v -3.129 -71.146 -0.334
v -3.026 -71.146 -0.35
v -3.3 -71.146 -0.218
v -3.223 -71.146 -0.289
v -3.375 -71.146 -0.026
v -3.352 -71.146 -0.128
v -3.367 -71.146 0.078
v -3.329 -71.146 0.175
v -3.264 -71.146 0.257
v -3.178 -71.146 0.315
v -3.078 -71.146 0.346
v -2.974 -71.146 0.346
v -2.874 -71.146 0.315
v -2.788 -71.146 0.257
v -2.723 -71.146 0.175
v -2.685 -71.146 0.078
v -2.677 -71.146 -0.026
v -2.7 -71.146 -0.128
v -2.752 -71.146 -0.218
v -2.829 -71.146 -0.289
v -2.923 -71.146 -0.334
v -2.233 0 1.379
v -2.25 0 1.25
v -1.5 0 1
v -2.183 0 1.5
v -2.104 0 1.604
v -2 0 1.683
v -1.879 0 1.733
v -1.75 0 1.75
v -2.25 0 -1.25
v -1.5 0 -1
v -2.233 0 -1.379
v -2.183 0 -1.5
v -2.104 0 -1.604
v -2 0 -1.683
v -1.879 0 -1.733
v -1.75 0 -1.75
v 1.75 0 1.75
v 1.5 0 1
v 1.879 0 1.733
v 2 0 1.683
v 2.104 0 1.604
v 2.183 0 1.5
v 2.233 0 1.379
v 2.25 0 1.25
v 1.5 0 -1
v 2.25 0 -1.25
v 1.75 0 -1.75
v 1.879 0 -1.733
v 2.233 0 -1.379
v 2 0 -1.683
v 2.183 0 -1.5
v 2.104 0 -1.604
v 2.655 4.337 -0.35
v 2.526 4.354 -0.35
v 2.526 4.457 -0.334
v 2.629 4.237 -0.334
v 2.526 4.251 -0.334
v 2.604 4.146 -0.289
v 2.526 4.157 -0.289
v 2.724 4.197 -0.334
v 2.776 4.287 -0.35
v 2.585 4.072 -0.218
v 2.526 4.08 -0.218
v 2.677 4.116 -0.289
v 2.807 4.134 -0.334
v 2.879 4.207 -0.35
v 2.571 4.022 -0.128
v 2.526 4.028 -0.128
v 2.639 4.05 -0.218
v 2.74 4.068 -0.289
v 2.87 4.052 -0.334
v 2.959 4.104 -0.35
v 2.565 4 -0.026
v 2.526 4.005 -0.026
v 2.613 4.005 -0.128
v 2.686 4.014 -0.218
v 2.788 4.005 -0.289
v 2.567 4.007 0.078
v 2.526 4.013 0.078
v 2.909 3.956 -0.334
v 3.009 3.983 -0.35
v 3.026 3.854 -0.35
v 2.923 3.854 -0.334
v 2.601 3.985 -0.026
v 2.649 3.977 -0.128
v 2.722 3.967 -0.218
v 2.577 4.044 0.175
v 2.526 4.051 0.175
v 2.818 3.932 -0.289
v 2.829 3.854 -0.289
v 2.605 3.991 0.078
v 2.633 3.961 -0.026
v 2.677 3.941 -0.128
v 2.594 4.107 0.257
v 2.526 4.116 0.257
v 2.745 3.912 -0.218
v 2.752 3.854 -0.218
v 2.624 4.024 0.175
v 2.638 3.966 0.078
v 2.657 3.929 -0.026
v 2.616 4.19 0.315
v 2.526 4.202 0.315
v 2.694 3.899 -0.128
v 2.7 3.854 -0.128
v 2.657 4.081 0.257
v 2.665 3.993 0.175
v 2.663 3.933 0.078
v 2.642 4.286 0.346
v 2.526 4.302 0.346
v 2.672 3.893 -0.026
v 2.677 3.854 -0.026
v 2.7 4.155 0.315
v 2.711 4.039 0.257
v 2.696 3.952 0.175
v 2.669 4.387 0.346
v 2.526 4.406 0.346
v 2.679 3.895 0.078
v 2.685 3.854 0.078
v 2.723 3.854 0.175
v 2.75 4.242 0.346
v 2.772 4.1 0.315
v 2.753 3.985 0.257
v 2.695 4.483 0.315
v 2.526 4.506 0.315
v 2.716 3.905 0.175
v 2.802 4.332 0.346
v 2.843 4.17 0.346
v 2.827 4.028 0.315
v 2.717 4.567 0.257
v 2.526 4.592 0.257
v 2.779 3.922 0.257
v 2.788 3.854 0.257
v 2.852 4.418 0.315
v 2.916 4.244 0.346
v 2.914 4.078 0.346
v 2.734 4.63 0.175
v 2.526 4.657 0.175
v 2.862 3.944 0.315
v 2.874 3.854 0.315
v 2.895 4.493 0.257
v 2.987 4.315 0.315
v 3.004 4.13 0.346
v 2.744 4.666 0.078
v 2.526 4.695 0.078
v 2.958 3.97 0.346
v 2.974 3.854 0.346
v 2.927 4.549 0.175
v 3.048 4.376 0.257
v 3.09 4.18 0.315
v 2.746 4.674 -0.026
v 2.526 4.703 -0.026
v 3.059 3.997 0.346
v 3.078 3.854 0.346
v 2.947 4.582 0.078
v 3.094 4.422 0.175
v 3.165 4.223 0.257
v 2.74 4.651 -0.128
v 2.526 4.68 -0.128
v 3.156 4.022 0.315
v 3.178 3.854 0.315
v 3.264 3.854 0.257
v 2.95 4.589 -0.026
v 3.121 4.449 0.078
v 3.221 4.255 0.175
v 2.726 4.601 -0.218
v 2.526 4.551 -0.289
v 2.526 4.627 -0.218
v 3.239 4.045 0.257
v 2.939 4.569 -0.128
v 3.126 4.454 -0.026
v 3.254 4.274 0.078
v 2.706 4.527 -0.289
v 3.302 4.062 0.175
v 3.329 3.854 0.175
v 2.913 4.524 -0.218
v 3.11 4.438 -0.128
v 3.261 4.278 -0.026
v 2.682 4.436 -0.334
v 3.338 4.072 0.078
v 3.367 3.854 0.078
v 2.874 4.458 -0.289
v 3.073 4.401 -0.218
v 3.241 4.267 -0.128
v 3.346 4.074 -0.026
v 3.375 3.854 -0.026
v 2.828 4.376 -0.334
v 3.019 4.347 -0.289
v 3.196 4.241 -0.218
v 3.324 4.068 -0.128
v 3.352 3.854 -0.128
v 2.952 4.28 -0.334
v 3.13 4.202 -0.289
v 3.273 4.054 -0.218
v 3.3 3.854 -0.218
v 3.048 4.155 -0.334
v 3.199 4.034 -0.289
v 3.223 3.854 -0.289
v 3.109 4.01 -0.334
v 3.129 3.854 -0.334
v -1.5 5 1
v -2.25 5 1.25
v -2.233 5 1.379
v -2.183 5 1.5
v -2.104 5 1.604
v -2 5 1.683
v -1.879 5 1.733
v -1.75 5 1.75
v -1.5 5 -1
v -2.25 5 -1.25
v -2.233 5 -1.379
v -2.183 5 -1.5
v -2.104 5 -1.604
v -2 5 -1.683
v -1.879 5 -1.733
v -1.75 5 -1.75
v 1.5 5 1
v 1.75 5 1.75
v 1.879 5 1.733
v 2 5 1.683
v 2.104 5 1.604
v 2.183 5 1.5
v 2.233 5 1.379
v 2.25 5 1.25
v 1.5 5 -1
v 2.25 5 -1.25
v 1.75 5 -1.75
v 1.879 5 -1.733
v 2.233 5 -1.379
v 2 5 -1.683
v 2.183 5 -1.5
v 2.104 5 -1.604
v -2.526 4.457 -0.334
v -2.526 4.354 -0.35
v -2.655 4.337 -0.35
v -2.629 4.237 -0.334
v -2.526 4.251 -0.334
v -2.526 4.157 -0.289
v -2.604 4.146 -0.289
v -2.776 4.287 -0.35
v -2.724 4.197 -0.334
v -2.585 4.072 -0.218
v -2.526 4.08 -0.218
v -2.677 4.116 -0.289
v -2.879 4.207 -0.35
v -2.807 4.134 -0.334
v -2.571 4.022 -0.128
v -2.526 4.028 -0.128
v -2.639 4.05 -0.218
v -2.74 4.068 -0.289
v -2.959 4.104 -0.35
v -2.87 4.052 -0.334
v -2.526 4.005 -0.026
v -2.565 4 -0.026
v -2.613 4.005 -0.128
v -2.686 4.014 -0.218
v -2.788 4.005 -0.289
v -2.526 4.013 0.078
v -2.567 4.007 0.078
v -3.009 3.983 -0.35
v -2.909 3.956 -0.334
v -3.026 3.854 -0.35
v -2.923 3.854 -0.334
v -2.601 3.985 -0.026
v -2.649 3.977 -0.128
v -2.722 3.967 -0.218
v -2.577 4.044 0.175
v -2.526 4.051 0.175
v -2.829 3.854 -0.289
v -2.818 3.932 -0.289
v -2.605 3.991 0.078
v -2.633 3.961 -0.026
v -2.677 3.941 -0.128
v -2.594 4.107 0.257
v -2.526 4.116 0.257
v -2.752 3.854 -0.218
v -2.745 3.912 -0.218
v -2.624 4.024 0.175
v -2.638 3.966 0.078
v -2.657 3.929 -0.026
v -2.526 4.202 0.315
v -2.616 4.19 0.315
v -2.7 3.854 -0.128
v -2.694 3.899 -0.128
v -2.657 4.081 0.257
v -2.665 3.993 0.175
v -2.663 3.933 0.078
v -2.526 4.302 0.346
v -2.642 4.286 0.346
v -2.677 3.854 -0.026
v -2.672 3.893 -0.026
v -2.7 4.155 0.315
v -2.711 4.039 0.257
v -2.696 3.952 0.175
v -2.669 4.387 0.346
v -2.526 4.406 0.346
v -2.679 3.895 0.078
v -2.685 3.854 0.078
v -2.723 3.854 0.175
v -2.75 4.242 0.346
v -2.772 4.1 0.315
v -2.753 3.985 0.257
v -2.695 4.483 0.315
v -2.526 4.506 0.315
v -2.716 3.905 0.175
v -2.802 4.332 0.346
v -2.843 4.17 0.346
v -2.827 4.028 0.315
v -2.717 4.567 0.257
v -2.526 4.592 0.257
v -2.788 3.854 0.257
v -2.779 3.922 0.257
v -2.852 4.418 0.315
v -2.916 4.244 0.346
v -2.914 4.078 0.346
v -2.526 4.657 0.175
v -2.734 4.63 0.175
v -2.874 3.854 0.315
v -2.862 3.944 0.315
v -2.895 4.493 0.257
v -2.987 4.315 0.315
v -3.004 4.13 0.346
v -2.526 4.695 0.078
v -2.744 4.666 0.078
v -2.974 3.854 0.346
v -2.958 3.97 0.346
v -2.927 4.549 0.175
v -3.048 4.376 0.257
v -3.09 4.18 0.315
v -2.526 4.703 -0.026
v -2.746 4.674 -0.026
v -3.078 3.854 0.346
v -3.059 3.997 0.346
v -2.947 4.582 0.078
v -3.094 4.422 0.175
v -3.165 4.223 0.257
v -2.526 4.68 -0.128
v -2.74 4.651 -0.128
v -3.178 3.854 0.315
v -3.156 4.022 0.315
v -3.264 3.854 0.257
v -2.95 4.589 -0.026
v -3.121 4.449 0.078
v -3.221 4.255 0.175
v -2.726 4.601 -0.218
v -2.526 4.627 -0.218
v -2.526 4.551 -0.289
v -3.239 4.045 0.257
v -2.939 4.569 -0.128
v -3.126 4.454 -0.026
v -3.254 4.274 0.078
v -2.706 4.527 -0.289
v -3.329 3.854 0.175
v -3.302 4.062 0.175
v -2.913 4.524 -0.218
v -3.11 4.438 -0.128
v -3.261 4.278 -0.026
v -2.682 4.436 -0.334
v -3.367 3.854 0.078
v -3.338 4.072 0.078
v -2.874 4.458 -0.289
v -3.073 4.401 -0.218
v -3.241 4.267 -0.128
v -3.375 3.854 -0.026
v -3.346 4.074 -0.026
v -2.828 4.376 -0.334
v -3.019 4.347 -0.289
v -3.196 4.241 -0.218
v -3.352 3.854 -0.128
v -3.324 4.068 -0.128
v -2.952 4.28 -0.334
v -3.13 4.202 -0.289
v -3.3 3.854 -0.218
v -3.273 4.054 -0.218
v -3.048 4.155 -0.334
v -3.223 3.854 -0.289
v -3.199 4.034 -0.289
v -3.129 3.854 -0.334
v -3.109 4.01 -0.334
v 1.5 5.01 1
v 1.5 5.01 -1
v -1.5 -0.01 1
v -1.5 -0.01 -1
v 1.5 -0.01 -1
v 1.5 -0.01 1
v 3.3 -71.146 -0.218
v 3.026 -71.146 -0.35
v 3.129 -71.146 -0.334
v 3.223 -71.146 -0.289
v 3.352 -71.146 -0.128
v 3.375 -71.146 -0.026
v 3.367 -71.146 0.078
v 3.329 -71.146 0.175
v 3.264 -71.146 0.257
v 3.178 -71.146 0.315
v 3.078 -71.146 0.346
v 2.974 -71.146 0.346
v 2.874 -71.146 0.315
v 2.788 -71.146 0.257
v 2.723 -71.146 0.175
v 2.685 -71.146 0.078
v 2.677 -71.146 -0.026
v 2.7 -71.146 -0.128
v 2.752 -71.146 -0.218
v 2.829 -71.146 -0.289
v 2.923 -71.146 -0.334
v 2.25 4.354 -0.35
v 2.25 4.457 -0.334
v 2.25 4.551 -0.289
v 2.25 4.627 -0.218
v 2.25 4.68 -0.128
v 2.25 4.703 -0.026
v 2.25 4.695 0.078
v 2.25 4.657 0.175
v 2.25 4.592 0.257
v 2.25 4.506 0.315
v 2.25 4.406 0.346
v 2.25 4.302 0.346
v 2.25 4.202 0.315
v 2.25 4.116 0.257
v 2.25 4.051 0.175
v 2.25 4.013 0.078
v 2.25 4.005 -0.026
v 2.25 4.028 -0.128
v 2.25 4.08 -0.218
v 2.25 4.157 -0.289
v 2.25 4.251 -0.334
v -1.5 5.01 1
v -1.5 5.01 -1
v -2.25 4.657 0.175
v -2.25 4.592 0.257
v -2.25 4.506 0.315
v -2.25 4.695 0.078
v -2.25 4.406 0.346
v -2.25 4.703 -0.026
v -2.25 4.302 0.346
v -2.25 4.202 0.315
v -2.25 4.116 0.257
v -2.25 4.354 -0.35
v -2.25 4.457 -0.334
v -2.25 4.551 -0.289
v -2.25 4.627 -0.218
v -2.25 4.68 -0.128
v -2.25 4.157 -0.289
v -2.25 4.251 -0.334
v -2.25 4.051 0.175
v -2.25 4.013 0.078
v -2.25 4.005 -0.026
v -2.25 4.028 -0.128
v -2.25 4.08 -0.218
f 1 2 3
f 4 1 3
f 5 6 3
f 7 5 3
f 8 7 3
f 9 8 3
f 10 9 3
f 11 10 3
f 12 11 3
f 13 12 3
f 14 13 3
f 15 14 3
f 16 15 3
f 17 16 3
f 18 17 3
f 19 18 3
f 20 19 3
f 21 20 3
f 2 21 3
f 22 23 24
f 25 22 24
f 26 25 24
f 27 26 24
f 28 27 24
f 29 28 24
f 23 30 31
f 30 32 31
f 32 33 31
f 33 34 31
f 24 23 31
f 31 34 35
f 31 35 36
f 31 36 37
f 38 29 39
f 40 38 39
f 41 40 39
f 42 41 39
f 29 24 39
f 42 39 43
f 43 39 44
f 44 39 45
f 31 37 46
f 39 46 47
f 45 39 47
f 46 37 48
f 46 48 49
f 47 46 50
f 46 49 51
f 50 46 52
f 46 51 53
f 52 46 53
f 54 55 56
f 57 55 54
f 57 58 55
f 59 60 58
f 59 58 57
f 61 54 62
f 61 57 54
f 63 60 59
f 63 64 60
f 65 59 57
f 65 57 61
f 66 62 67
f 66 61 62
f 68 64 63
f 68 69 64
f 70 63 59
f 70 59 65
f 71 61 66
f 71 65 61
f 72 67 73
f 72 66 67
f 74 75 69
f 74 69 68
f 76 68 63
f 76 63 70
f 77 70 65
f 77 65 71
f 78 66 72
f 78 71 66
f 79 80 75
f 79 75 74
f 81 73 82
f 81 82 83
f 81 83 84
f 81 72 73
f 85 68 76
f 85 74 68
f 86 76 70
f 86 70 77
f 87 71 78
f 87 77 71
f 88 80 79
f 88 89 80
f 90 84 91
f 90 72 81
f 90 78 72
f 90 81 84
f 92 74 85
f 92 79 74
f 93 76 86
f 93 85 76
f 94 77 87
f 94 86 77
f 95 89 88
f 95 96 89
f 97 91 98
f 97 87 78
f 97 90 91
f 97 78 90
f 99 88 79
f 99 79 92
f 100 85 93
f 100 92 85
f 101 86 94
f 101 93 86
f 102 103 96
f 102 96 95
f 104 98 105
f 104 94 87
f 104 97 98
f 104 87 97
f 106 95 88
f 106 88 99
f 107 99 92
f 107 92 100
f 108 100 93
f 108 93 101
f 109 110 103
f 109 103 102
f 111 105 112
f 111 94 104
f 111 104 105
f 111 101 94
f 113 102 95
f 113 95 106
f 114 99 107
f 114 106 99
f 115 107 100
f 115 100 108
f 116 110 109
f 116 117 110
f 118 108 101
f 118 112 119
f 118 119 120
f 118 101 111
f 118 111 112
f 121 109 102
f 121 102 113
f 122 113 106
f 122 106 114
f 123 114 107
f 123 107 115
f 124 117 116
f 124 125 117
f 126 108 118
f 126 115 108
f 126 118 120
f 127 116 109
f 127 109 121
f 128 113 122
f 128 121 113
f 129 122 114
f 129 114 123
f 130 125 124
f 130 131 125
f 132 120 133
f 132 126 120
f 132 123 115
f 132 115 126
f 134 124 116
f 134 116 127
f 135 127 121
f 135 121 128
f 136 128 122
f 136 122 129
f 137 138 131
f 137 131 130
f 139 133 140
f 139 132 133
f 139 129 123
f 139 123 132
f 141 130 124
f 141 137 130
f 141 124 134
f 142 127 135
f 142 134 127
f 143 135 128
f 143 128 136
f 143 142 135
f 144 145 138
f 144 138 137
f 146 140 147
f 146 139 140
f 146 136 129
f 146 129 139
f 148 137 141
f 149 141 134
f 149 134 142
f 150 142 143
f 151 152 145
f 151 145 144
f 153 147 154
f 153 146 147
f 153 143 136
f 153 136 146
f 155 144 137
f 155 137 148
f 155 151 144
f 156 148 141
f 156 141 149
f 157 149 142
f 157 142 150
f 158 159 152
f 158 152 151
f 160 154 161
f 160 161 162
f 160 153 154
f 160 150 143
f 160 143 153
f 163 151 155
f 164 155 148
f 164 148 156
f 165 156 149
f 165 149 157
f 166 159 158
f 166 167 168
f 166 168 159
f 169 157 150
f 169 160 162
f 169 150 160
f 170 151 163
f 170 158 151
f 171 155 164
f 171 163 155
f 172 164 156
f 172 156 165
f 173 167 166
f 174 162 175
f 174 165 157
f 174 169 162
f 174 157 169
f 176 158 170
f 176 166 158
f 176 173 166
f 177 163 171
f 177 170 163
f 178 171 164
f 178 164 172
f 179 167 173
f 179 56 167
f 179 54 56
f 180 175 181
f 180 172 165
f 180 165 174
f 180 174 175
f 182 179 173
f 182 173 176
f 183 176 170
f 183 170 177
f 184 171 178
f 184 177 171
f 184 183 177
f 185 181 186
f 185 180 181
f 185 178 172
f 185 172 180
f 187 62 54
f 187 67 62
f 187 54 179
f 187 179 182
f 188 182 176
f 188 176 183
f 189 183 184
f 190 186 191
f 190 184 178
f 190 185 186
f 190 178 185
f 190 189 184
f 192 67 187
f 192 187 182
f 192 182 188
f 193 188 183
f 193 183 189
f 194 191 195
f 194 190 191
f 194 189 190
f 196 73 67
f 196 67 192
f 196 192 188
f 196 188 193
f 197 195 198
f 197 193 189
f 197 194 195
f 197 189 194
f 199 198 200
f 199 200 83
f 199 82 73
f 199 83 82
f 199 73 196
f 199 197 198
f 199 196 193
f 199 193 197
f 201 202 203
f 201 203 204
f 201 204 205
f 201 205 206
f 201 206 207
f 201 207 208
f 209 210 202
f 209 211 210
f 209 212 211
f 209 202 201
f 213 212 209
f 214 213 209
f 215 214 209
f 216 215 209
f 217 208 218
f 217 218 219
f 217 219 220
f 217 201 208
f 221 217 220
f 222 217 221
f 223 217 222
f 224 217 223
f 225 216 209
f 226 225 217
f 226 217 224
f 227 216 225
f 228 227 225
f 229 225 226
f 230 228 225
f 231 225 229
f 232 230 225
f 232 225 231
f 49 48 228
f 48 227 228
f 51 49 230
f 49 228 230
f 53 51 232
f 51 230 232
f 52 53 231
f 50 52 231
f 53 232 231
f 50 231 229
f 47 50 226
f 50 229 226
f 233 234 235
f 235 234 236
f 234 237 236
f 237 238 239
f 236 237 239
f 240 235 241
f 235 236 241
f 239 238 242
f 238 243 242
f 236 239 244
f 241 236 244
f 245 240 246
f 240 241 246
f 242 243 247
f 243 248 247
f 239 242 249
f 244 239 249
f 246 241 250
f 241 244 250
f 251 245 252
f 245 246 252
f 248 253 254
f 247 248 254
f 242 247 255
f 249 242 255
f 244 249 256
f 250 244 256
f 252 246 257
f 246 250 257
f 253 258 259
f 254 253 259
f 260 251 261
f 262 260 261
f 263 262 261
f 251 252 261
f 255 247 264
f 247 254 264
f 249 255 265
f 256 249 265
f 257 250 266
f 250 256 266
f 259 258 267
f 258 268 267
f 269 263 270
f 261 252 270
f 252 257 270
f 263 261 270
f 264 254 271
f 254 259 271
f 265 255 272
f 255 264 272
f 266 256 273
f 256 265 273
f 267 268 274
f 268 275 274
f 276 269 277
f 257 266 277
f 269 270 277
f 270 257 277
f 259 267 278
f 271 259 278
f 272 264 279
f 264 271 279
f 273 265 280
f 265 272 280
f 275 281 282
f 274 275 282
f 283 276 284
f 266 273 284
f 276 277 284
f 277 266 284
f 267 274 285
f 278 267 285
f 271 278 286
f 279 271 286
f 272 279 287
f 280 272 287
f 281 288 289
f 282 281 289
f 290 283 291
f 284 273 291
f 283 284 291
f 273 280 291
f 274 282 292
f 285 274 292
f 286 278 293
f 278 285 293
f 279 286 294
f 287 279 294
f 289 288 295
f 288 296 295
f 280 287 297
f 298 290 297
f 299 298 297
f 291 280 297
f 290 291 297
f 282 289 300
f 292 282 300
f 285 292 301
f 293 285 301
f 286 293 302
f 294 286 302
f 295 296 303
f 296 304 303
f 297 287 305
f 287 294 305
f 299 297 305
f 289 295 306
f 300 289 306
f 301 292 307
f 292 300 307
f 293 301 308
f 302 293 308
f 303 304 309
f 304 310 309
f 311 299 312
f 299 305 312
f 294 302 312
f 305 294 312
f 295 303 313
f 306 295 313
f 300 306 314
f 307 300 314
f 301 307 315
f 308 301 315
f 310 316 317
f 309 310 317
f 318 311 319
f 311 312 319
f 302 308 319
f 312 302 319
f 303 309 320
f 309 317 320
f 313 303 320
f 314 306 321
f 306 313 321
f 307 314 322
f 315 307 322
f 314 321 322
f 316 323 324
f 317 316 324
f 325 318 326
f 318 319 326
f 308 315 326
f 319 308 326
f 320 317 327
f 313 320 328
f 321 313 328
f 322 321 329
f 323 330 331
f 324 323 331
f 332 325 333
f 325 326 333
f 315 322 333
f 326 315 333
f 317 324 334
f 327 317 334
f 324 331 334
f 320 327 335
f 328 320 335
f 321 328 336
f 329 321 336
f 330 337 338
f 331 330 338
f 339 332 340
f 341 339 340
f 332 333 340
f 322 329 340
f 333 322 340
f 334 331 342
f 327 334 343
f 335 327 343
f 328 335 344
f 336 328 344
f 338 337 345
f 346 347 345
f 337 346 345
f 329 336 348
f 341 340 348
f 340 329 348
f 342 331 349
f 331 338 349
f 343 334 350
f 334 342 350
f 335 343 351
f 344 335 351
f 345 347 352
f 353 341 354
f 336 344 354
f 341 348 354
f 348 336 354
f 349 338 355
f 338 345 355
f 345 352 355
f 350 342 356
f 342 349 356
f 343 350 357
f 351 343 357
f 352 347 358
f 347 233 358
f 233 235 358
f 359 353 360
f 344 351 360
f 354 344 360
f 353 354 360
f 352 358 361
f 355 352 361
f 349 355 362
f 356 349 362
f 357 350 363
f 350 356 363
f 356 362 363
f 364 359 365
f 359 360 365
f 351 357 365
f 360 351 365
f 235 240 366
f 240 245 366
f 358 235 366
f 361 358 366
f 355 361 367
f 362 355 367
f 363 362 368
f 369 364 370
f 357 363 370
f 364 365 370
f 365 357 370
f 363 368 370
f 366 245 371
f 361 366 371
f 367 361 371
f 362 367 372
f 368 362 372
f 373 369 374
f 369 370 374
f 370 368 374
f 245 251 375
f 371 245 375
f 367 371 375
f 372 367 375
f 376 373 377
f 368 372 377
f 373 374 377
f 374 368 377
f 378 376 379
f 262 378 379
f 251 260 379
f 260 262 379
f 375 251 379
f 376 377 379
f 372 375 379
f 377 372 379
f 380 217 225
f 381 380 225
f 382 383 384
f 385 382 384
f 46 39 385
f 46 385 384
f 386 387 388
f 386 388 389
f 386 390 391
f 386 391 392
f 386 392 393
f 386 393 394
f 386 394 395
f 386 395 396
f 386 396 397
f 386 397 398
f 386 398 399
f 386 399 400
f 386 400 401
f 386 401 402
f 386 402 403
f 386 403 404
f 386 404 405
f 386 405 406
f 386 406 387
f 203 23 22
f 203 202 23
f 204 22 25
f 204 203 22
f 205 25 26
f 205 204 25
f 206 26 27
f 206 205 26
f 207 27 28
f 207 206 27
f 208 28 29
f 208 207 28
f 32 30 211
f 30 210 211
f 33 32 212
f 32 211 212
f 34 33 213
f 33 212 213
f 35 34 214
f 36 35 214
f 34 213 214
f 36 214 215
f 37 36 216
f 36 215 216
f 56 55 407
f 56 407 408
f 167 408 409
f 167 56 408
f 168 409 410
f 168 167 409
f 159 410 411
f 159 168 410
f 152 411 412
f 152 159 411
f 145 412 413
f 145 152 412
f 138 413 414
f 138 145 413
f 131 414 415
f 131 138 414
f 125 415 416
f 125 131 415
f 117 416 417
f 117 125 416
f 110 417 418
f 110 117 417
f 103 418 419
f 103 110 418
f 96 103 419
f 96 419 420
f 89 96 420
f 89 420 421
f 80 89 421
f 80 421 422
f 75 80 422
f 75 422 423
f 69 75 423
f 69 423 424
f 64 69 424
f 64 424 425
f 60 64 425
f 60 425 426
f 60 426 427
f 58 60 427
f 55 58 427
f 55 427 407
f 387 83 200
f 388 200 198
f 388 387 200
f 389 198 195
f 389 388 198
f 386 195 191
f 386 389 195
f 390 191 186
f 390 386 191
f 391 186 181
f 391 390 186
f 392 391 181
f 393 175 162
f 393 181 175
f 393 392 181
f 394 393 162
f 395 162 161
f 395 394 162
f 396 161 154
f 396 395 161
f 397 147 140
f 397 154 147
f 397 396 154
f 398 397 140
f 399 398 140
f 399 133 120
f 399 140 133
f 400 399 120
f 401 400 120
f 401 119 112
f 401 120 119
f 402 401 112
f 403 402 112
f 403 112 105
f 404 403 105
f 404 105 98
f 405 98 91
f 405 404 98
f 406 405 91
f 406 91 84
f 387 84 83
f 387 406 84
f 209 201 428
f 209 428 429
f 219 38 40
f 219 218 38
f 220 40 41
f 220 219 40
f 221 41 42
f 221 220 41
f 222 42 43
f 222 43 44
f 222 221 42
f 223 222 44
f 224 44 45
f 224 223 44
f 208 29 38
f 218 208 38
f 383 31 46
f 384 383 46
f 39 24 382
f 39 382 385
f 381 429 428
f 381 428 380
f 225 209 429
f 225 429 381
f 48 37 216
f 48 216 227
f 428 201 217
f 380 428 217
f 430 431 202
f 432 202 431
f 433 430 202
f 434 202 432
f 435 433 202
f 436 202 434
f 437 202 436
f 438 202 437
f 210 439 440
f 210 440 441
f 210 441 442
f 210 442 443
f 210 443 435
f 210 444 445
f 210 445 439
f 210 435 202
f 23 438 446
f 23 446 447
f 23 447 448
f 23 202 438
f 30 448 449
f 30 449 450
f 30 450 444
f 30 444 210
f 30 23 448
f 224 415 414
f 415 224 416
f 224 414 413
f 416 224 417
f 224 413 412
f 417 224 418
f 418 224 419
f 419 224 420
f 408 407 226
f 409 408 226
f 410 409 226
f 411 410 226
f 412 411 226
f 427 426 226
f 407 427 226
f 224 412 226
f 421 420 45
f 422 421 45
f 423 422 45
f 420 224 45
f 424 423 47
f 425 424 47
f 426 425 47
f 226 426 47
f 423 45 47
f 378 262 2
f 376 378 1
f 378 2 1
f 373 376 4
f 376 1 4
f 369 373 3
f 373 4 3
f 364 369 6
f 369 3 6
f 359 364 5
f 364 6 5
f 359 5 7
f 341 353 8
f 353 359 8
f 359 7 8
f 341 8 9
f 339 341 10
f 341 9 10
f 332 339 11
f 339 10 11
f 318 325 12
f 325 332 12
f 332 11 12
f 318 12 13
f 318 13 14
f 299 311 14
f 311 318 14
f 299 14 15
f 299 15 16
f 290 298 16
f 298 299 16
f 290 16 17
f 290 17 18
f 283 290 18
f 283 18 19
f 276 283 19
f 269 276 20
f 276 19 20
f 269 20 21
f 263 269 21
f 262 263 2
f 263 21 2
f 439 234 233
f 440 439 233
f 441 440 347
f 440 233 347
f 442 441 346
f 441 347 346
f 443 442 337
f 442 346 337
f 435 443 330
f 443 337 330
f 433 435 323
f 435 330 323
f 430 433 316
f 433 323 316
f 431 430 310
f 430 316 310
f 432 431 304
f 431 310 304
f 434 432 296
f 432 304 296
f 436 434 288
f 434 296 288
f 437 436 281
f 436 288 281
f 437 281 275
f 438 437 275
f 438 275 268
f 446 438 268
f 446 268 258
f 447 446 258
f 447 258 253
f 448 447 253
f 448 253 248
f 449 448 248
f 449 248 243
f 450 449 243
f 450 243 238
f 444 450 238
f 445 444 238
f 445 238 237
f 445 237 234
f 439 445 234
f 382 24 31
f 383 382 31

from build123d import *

# Parameters (mm, degrees)
SKETCH1_W                = 4.5
SKETCH1_H                = 3.5
BOSS_EXTRUDE1_DEPTH      = 5
SKETCH2_W                = 3
SKETCH2_H                = 2
BOSS_EXTRUDE2_DEPTH      = 5.01
BOSS_EXTRUDE2_DEPTH_BACK = 0.01
FILLET2_R                = 0.5
SKETCH14_R               = 0.35


with BuildPart() as part:
    # Sketch1 → Boss-Extrude1 (new body)
    with BuildSketch(Plane(origin=(0, 0, 0), x_dir=(1, 0, 0), z_dir=(0, 1, 0))):
        Rectangle(SKETCH1_W, SKETCH1_H)
    extrude(amount=BOSS_EXTRUDE1_DEPTH)

    # Sketch2 → Boss-Extrude2 (add, two sides)
    with BuildSketch(Plane(origin=(0, 0, 0), x_dir=(1, 0, 0), z_dir=(0, 1, 0))) as boss_extrude2_sk:
        Rectangle(SKETCH2_W, SKETCH2_H)
    extrude(amount=BOSS_EXTRUDE2_DEPTH)
    extrude(boss_extrude2_sk.sketch, amount=-BOSS_EXTRUDE2_DEPTH_BACK)

    # Fillet2
    fillet2_edges = [part.edges().sort_by_distance(p)[0] for p in [
        (2.25, 2.5, 1.75),
        (-2.25, 2.5, 1.75),
        (-2.25, 2.5, -1.75),
        (2.25, 2.5, -1.75),
    ]]
    fillet(fillet2_edges, radius=FILLET2_R)

    # Sweep1: sweep along a path in Sketch15
    with BuildLine(Plane.XY) as sweep1_path:
        Line((2.25, 4.353782078), (2.3, 4.353782078))
        Line((2.3, 4.353782078), (2.525918375, 4.353782078))
        ThreePointArc((2.525918375, 4.353782078), (2.879471766, 4.207335469), (3.025918375, 3.853782078))
        Line((3.025918375, 3.853782078), (3.025918375, -71.146217922))
    # Sketch14 → Sweep1 (sweep)
    with BuildSketch(Plane(origin=(2.25, 0, 0), x_dir=(0, 0, -1), z_dir=(1, 0, 0))):
        with Locations((0, 4.353782078)):
            Circle(SKETCH14_R)
    sweep1 = sweep(path=sweep1_path.line)

    # Mirror1: Sweep1 across plane
    add(sweep1.mirror(Plane(origin=(0, 0, 0), x_dir=(0, 0, 1), z_dir=(1, 0, 0))))


solid = part.part
